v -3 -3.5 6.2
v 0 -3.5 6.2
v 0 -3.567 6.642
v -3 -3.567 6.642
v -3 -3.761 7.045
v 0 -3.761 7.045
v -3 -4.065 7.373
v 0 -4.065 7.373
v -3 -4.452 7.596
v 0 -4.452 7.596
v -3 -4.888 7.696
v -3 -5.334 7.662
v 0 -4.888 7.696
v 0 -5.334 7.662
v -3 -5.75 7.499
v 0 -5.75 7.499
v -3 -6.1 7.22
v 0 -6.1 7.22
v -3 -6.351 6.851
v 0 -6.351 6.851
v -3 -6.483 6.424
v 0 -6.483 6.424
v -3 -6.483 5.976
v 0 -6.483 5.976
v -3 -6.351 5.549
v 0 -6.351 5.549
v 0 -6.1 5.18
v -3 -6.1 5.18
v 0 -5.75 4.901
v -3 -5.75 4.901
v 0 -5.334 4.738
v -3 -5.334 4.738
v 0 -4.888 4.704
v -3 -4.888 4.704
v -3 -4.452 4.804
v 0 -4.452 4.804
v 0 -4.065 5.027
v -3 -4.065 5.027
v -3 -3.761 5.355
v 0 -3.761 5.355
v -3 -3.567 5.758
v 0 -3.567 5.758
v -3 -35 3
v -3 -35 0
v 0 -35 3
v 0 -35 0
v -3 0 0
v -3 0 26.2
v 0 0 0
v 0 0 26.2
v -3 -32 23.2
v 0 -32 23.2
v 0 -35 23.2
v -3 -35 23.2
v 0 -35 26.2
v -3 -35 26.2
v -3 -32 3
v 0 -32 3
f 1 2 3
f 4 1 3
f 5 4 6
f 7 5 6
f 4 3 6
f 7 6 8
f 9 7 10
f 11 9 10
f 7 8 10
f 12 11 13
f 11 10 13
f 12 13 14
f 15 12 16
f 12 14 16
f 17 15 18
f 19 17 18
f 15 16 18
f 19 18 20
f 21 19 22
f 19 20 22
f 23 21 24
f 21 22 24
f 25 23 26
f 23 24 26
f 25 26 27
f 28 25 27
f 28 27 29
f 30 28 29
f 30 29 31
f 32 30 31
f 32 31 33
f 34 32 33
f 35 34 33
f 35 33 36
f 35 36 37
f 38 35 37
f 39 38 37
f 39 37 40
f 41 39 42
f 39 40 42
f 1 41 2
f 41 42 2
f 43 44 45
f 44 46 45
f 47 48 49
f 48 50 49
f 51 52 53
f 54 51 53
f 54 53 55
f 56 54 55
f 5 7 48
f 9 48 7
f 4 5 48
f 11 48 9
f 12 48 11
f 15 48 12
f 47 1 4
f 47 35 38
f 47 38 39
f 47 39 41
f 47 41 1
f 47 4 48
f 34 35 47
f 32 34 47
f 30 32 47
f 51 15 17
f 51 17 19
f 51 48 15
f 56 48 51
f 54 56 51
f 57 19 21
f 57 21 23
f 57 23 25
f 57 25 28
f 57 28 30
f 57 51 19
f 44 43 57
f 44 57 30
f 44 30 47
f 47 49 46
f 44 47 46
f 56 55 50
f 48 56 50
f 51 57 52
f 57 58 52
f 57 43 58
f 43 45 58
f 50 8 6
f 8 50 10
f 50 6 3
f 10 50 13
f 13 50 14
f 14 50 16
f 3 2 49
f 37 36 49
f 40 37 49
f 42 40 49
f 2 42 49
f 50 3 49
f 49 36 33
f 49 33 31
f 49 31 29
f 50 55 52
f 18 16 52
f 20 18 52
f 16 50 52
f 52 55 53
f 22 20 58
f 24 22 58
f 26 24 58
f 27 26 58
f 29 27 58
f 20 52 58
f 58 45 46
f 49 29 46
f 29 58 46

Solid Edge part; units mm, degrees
sketch "Sketch1" plane through (0, 0, 0) normal (1, 0, 0) x (0, 1, 0)
  circle A0 centre (-5, 6.2) radius 1.5
  line L0 (0, 26.2) -> (0, 0)
  line L1 (0, 0) -> (-35, 0)
  line L2 (-35, 0) -> (-35, 3)
  line L3 (-35, 3) -> (-32, 3)
  line L4 (-32, 3) -> (-32, 23.2)
  line L5 (-32, 23.2) -> (-35, 23.2)
  line L6 (-35, 23.2) -> (-35, 26.2)
  line L7 (-35, 26.2) -> (0, 26.2)
  dimension "D1" = 3
  dimension "D2" = 3
  dimension "D3" = 20.2
  dimension "D4" = 20
  dimension "D5" = 27
  dimension "D6" = 5
extrude "Protrusion1" add sketch "Sketch1" against normal blind 3
properties material "Acier"
